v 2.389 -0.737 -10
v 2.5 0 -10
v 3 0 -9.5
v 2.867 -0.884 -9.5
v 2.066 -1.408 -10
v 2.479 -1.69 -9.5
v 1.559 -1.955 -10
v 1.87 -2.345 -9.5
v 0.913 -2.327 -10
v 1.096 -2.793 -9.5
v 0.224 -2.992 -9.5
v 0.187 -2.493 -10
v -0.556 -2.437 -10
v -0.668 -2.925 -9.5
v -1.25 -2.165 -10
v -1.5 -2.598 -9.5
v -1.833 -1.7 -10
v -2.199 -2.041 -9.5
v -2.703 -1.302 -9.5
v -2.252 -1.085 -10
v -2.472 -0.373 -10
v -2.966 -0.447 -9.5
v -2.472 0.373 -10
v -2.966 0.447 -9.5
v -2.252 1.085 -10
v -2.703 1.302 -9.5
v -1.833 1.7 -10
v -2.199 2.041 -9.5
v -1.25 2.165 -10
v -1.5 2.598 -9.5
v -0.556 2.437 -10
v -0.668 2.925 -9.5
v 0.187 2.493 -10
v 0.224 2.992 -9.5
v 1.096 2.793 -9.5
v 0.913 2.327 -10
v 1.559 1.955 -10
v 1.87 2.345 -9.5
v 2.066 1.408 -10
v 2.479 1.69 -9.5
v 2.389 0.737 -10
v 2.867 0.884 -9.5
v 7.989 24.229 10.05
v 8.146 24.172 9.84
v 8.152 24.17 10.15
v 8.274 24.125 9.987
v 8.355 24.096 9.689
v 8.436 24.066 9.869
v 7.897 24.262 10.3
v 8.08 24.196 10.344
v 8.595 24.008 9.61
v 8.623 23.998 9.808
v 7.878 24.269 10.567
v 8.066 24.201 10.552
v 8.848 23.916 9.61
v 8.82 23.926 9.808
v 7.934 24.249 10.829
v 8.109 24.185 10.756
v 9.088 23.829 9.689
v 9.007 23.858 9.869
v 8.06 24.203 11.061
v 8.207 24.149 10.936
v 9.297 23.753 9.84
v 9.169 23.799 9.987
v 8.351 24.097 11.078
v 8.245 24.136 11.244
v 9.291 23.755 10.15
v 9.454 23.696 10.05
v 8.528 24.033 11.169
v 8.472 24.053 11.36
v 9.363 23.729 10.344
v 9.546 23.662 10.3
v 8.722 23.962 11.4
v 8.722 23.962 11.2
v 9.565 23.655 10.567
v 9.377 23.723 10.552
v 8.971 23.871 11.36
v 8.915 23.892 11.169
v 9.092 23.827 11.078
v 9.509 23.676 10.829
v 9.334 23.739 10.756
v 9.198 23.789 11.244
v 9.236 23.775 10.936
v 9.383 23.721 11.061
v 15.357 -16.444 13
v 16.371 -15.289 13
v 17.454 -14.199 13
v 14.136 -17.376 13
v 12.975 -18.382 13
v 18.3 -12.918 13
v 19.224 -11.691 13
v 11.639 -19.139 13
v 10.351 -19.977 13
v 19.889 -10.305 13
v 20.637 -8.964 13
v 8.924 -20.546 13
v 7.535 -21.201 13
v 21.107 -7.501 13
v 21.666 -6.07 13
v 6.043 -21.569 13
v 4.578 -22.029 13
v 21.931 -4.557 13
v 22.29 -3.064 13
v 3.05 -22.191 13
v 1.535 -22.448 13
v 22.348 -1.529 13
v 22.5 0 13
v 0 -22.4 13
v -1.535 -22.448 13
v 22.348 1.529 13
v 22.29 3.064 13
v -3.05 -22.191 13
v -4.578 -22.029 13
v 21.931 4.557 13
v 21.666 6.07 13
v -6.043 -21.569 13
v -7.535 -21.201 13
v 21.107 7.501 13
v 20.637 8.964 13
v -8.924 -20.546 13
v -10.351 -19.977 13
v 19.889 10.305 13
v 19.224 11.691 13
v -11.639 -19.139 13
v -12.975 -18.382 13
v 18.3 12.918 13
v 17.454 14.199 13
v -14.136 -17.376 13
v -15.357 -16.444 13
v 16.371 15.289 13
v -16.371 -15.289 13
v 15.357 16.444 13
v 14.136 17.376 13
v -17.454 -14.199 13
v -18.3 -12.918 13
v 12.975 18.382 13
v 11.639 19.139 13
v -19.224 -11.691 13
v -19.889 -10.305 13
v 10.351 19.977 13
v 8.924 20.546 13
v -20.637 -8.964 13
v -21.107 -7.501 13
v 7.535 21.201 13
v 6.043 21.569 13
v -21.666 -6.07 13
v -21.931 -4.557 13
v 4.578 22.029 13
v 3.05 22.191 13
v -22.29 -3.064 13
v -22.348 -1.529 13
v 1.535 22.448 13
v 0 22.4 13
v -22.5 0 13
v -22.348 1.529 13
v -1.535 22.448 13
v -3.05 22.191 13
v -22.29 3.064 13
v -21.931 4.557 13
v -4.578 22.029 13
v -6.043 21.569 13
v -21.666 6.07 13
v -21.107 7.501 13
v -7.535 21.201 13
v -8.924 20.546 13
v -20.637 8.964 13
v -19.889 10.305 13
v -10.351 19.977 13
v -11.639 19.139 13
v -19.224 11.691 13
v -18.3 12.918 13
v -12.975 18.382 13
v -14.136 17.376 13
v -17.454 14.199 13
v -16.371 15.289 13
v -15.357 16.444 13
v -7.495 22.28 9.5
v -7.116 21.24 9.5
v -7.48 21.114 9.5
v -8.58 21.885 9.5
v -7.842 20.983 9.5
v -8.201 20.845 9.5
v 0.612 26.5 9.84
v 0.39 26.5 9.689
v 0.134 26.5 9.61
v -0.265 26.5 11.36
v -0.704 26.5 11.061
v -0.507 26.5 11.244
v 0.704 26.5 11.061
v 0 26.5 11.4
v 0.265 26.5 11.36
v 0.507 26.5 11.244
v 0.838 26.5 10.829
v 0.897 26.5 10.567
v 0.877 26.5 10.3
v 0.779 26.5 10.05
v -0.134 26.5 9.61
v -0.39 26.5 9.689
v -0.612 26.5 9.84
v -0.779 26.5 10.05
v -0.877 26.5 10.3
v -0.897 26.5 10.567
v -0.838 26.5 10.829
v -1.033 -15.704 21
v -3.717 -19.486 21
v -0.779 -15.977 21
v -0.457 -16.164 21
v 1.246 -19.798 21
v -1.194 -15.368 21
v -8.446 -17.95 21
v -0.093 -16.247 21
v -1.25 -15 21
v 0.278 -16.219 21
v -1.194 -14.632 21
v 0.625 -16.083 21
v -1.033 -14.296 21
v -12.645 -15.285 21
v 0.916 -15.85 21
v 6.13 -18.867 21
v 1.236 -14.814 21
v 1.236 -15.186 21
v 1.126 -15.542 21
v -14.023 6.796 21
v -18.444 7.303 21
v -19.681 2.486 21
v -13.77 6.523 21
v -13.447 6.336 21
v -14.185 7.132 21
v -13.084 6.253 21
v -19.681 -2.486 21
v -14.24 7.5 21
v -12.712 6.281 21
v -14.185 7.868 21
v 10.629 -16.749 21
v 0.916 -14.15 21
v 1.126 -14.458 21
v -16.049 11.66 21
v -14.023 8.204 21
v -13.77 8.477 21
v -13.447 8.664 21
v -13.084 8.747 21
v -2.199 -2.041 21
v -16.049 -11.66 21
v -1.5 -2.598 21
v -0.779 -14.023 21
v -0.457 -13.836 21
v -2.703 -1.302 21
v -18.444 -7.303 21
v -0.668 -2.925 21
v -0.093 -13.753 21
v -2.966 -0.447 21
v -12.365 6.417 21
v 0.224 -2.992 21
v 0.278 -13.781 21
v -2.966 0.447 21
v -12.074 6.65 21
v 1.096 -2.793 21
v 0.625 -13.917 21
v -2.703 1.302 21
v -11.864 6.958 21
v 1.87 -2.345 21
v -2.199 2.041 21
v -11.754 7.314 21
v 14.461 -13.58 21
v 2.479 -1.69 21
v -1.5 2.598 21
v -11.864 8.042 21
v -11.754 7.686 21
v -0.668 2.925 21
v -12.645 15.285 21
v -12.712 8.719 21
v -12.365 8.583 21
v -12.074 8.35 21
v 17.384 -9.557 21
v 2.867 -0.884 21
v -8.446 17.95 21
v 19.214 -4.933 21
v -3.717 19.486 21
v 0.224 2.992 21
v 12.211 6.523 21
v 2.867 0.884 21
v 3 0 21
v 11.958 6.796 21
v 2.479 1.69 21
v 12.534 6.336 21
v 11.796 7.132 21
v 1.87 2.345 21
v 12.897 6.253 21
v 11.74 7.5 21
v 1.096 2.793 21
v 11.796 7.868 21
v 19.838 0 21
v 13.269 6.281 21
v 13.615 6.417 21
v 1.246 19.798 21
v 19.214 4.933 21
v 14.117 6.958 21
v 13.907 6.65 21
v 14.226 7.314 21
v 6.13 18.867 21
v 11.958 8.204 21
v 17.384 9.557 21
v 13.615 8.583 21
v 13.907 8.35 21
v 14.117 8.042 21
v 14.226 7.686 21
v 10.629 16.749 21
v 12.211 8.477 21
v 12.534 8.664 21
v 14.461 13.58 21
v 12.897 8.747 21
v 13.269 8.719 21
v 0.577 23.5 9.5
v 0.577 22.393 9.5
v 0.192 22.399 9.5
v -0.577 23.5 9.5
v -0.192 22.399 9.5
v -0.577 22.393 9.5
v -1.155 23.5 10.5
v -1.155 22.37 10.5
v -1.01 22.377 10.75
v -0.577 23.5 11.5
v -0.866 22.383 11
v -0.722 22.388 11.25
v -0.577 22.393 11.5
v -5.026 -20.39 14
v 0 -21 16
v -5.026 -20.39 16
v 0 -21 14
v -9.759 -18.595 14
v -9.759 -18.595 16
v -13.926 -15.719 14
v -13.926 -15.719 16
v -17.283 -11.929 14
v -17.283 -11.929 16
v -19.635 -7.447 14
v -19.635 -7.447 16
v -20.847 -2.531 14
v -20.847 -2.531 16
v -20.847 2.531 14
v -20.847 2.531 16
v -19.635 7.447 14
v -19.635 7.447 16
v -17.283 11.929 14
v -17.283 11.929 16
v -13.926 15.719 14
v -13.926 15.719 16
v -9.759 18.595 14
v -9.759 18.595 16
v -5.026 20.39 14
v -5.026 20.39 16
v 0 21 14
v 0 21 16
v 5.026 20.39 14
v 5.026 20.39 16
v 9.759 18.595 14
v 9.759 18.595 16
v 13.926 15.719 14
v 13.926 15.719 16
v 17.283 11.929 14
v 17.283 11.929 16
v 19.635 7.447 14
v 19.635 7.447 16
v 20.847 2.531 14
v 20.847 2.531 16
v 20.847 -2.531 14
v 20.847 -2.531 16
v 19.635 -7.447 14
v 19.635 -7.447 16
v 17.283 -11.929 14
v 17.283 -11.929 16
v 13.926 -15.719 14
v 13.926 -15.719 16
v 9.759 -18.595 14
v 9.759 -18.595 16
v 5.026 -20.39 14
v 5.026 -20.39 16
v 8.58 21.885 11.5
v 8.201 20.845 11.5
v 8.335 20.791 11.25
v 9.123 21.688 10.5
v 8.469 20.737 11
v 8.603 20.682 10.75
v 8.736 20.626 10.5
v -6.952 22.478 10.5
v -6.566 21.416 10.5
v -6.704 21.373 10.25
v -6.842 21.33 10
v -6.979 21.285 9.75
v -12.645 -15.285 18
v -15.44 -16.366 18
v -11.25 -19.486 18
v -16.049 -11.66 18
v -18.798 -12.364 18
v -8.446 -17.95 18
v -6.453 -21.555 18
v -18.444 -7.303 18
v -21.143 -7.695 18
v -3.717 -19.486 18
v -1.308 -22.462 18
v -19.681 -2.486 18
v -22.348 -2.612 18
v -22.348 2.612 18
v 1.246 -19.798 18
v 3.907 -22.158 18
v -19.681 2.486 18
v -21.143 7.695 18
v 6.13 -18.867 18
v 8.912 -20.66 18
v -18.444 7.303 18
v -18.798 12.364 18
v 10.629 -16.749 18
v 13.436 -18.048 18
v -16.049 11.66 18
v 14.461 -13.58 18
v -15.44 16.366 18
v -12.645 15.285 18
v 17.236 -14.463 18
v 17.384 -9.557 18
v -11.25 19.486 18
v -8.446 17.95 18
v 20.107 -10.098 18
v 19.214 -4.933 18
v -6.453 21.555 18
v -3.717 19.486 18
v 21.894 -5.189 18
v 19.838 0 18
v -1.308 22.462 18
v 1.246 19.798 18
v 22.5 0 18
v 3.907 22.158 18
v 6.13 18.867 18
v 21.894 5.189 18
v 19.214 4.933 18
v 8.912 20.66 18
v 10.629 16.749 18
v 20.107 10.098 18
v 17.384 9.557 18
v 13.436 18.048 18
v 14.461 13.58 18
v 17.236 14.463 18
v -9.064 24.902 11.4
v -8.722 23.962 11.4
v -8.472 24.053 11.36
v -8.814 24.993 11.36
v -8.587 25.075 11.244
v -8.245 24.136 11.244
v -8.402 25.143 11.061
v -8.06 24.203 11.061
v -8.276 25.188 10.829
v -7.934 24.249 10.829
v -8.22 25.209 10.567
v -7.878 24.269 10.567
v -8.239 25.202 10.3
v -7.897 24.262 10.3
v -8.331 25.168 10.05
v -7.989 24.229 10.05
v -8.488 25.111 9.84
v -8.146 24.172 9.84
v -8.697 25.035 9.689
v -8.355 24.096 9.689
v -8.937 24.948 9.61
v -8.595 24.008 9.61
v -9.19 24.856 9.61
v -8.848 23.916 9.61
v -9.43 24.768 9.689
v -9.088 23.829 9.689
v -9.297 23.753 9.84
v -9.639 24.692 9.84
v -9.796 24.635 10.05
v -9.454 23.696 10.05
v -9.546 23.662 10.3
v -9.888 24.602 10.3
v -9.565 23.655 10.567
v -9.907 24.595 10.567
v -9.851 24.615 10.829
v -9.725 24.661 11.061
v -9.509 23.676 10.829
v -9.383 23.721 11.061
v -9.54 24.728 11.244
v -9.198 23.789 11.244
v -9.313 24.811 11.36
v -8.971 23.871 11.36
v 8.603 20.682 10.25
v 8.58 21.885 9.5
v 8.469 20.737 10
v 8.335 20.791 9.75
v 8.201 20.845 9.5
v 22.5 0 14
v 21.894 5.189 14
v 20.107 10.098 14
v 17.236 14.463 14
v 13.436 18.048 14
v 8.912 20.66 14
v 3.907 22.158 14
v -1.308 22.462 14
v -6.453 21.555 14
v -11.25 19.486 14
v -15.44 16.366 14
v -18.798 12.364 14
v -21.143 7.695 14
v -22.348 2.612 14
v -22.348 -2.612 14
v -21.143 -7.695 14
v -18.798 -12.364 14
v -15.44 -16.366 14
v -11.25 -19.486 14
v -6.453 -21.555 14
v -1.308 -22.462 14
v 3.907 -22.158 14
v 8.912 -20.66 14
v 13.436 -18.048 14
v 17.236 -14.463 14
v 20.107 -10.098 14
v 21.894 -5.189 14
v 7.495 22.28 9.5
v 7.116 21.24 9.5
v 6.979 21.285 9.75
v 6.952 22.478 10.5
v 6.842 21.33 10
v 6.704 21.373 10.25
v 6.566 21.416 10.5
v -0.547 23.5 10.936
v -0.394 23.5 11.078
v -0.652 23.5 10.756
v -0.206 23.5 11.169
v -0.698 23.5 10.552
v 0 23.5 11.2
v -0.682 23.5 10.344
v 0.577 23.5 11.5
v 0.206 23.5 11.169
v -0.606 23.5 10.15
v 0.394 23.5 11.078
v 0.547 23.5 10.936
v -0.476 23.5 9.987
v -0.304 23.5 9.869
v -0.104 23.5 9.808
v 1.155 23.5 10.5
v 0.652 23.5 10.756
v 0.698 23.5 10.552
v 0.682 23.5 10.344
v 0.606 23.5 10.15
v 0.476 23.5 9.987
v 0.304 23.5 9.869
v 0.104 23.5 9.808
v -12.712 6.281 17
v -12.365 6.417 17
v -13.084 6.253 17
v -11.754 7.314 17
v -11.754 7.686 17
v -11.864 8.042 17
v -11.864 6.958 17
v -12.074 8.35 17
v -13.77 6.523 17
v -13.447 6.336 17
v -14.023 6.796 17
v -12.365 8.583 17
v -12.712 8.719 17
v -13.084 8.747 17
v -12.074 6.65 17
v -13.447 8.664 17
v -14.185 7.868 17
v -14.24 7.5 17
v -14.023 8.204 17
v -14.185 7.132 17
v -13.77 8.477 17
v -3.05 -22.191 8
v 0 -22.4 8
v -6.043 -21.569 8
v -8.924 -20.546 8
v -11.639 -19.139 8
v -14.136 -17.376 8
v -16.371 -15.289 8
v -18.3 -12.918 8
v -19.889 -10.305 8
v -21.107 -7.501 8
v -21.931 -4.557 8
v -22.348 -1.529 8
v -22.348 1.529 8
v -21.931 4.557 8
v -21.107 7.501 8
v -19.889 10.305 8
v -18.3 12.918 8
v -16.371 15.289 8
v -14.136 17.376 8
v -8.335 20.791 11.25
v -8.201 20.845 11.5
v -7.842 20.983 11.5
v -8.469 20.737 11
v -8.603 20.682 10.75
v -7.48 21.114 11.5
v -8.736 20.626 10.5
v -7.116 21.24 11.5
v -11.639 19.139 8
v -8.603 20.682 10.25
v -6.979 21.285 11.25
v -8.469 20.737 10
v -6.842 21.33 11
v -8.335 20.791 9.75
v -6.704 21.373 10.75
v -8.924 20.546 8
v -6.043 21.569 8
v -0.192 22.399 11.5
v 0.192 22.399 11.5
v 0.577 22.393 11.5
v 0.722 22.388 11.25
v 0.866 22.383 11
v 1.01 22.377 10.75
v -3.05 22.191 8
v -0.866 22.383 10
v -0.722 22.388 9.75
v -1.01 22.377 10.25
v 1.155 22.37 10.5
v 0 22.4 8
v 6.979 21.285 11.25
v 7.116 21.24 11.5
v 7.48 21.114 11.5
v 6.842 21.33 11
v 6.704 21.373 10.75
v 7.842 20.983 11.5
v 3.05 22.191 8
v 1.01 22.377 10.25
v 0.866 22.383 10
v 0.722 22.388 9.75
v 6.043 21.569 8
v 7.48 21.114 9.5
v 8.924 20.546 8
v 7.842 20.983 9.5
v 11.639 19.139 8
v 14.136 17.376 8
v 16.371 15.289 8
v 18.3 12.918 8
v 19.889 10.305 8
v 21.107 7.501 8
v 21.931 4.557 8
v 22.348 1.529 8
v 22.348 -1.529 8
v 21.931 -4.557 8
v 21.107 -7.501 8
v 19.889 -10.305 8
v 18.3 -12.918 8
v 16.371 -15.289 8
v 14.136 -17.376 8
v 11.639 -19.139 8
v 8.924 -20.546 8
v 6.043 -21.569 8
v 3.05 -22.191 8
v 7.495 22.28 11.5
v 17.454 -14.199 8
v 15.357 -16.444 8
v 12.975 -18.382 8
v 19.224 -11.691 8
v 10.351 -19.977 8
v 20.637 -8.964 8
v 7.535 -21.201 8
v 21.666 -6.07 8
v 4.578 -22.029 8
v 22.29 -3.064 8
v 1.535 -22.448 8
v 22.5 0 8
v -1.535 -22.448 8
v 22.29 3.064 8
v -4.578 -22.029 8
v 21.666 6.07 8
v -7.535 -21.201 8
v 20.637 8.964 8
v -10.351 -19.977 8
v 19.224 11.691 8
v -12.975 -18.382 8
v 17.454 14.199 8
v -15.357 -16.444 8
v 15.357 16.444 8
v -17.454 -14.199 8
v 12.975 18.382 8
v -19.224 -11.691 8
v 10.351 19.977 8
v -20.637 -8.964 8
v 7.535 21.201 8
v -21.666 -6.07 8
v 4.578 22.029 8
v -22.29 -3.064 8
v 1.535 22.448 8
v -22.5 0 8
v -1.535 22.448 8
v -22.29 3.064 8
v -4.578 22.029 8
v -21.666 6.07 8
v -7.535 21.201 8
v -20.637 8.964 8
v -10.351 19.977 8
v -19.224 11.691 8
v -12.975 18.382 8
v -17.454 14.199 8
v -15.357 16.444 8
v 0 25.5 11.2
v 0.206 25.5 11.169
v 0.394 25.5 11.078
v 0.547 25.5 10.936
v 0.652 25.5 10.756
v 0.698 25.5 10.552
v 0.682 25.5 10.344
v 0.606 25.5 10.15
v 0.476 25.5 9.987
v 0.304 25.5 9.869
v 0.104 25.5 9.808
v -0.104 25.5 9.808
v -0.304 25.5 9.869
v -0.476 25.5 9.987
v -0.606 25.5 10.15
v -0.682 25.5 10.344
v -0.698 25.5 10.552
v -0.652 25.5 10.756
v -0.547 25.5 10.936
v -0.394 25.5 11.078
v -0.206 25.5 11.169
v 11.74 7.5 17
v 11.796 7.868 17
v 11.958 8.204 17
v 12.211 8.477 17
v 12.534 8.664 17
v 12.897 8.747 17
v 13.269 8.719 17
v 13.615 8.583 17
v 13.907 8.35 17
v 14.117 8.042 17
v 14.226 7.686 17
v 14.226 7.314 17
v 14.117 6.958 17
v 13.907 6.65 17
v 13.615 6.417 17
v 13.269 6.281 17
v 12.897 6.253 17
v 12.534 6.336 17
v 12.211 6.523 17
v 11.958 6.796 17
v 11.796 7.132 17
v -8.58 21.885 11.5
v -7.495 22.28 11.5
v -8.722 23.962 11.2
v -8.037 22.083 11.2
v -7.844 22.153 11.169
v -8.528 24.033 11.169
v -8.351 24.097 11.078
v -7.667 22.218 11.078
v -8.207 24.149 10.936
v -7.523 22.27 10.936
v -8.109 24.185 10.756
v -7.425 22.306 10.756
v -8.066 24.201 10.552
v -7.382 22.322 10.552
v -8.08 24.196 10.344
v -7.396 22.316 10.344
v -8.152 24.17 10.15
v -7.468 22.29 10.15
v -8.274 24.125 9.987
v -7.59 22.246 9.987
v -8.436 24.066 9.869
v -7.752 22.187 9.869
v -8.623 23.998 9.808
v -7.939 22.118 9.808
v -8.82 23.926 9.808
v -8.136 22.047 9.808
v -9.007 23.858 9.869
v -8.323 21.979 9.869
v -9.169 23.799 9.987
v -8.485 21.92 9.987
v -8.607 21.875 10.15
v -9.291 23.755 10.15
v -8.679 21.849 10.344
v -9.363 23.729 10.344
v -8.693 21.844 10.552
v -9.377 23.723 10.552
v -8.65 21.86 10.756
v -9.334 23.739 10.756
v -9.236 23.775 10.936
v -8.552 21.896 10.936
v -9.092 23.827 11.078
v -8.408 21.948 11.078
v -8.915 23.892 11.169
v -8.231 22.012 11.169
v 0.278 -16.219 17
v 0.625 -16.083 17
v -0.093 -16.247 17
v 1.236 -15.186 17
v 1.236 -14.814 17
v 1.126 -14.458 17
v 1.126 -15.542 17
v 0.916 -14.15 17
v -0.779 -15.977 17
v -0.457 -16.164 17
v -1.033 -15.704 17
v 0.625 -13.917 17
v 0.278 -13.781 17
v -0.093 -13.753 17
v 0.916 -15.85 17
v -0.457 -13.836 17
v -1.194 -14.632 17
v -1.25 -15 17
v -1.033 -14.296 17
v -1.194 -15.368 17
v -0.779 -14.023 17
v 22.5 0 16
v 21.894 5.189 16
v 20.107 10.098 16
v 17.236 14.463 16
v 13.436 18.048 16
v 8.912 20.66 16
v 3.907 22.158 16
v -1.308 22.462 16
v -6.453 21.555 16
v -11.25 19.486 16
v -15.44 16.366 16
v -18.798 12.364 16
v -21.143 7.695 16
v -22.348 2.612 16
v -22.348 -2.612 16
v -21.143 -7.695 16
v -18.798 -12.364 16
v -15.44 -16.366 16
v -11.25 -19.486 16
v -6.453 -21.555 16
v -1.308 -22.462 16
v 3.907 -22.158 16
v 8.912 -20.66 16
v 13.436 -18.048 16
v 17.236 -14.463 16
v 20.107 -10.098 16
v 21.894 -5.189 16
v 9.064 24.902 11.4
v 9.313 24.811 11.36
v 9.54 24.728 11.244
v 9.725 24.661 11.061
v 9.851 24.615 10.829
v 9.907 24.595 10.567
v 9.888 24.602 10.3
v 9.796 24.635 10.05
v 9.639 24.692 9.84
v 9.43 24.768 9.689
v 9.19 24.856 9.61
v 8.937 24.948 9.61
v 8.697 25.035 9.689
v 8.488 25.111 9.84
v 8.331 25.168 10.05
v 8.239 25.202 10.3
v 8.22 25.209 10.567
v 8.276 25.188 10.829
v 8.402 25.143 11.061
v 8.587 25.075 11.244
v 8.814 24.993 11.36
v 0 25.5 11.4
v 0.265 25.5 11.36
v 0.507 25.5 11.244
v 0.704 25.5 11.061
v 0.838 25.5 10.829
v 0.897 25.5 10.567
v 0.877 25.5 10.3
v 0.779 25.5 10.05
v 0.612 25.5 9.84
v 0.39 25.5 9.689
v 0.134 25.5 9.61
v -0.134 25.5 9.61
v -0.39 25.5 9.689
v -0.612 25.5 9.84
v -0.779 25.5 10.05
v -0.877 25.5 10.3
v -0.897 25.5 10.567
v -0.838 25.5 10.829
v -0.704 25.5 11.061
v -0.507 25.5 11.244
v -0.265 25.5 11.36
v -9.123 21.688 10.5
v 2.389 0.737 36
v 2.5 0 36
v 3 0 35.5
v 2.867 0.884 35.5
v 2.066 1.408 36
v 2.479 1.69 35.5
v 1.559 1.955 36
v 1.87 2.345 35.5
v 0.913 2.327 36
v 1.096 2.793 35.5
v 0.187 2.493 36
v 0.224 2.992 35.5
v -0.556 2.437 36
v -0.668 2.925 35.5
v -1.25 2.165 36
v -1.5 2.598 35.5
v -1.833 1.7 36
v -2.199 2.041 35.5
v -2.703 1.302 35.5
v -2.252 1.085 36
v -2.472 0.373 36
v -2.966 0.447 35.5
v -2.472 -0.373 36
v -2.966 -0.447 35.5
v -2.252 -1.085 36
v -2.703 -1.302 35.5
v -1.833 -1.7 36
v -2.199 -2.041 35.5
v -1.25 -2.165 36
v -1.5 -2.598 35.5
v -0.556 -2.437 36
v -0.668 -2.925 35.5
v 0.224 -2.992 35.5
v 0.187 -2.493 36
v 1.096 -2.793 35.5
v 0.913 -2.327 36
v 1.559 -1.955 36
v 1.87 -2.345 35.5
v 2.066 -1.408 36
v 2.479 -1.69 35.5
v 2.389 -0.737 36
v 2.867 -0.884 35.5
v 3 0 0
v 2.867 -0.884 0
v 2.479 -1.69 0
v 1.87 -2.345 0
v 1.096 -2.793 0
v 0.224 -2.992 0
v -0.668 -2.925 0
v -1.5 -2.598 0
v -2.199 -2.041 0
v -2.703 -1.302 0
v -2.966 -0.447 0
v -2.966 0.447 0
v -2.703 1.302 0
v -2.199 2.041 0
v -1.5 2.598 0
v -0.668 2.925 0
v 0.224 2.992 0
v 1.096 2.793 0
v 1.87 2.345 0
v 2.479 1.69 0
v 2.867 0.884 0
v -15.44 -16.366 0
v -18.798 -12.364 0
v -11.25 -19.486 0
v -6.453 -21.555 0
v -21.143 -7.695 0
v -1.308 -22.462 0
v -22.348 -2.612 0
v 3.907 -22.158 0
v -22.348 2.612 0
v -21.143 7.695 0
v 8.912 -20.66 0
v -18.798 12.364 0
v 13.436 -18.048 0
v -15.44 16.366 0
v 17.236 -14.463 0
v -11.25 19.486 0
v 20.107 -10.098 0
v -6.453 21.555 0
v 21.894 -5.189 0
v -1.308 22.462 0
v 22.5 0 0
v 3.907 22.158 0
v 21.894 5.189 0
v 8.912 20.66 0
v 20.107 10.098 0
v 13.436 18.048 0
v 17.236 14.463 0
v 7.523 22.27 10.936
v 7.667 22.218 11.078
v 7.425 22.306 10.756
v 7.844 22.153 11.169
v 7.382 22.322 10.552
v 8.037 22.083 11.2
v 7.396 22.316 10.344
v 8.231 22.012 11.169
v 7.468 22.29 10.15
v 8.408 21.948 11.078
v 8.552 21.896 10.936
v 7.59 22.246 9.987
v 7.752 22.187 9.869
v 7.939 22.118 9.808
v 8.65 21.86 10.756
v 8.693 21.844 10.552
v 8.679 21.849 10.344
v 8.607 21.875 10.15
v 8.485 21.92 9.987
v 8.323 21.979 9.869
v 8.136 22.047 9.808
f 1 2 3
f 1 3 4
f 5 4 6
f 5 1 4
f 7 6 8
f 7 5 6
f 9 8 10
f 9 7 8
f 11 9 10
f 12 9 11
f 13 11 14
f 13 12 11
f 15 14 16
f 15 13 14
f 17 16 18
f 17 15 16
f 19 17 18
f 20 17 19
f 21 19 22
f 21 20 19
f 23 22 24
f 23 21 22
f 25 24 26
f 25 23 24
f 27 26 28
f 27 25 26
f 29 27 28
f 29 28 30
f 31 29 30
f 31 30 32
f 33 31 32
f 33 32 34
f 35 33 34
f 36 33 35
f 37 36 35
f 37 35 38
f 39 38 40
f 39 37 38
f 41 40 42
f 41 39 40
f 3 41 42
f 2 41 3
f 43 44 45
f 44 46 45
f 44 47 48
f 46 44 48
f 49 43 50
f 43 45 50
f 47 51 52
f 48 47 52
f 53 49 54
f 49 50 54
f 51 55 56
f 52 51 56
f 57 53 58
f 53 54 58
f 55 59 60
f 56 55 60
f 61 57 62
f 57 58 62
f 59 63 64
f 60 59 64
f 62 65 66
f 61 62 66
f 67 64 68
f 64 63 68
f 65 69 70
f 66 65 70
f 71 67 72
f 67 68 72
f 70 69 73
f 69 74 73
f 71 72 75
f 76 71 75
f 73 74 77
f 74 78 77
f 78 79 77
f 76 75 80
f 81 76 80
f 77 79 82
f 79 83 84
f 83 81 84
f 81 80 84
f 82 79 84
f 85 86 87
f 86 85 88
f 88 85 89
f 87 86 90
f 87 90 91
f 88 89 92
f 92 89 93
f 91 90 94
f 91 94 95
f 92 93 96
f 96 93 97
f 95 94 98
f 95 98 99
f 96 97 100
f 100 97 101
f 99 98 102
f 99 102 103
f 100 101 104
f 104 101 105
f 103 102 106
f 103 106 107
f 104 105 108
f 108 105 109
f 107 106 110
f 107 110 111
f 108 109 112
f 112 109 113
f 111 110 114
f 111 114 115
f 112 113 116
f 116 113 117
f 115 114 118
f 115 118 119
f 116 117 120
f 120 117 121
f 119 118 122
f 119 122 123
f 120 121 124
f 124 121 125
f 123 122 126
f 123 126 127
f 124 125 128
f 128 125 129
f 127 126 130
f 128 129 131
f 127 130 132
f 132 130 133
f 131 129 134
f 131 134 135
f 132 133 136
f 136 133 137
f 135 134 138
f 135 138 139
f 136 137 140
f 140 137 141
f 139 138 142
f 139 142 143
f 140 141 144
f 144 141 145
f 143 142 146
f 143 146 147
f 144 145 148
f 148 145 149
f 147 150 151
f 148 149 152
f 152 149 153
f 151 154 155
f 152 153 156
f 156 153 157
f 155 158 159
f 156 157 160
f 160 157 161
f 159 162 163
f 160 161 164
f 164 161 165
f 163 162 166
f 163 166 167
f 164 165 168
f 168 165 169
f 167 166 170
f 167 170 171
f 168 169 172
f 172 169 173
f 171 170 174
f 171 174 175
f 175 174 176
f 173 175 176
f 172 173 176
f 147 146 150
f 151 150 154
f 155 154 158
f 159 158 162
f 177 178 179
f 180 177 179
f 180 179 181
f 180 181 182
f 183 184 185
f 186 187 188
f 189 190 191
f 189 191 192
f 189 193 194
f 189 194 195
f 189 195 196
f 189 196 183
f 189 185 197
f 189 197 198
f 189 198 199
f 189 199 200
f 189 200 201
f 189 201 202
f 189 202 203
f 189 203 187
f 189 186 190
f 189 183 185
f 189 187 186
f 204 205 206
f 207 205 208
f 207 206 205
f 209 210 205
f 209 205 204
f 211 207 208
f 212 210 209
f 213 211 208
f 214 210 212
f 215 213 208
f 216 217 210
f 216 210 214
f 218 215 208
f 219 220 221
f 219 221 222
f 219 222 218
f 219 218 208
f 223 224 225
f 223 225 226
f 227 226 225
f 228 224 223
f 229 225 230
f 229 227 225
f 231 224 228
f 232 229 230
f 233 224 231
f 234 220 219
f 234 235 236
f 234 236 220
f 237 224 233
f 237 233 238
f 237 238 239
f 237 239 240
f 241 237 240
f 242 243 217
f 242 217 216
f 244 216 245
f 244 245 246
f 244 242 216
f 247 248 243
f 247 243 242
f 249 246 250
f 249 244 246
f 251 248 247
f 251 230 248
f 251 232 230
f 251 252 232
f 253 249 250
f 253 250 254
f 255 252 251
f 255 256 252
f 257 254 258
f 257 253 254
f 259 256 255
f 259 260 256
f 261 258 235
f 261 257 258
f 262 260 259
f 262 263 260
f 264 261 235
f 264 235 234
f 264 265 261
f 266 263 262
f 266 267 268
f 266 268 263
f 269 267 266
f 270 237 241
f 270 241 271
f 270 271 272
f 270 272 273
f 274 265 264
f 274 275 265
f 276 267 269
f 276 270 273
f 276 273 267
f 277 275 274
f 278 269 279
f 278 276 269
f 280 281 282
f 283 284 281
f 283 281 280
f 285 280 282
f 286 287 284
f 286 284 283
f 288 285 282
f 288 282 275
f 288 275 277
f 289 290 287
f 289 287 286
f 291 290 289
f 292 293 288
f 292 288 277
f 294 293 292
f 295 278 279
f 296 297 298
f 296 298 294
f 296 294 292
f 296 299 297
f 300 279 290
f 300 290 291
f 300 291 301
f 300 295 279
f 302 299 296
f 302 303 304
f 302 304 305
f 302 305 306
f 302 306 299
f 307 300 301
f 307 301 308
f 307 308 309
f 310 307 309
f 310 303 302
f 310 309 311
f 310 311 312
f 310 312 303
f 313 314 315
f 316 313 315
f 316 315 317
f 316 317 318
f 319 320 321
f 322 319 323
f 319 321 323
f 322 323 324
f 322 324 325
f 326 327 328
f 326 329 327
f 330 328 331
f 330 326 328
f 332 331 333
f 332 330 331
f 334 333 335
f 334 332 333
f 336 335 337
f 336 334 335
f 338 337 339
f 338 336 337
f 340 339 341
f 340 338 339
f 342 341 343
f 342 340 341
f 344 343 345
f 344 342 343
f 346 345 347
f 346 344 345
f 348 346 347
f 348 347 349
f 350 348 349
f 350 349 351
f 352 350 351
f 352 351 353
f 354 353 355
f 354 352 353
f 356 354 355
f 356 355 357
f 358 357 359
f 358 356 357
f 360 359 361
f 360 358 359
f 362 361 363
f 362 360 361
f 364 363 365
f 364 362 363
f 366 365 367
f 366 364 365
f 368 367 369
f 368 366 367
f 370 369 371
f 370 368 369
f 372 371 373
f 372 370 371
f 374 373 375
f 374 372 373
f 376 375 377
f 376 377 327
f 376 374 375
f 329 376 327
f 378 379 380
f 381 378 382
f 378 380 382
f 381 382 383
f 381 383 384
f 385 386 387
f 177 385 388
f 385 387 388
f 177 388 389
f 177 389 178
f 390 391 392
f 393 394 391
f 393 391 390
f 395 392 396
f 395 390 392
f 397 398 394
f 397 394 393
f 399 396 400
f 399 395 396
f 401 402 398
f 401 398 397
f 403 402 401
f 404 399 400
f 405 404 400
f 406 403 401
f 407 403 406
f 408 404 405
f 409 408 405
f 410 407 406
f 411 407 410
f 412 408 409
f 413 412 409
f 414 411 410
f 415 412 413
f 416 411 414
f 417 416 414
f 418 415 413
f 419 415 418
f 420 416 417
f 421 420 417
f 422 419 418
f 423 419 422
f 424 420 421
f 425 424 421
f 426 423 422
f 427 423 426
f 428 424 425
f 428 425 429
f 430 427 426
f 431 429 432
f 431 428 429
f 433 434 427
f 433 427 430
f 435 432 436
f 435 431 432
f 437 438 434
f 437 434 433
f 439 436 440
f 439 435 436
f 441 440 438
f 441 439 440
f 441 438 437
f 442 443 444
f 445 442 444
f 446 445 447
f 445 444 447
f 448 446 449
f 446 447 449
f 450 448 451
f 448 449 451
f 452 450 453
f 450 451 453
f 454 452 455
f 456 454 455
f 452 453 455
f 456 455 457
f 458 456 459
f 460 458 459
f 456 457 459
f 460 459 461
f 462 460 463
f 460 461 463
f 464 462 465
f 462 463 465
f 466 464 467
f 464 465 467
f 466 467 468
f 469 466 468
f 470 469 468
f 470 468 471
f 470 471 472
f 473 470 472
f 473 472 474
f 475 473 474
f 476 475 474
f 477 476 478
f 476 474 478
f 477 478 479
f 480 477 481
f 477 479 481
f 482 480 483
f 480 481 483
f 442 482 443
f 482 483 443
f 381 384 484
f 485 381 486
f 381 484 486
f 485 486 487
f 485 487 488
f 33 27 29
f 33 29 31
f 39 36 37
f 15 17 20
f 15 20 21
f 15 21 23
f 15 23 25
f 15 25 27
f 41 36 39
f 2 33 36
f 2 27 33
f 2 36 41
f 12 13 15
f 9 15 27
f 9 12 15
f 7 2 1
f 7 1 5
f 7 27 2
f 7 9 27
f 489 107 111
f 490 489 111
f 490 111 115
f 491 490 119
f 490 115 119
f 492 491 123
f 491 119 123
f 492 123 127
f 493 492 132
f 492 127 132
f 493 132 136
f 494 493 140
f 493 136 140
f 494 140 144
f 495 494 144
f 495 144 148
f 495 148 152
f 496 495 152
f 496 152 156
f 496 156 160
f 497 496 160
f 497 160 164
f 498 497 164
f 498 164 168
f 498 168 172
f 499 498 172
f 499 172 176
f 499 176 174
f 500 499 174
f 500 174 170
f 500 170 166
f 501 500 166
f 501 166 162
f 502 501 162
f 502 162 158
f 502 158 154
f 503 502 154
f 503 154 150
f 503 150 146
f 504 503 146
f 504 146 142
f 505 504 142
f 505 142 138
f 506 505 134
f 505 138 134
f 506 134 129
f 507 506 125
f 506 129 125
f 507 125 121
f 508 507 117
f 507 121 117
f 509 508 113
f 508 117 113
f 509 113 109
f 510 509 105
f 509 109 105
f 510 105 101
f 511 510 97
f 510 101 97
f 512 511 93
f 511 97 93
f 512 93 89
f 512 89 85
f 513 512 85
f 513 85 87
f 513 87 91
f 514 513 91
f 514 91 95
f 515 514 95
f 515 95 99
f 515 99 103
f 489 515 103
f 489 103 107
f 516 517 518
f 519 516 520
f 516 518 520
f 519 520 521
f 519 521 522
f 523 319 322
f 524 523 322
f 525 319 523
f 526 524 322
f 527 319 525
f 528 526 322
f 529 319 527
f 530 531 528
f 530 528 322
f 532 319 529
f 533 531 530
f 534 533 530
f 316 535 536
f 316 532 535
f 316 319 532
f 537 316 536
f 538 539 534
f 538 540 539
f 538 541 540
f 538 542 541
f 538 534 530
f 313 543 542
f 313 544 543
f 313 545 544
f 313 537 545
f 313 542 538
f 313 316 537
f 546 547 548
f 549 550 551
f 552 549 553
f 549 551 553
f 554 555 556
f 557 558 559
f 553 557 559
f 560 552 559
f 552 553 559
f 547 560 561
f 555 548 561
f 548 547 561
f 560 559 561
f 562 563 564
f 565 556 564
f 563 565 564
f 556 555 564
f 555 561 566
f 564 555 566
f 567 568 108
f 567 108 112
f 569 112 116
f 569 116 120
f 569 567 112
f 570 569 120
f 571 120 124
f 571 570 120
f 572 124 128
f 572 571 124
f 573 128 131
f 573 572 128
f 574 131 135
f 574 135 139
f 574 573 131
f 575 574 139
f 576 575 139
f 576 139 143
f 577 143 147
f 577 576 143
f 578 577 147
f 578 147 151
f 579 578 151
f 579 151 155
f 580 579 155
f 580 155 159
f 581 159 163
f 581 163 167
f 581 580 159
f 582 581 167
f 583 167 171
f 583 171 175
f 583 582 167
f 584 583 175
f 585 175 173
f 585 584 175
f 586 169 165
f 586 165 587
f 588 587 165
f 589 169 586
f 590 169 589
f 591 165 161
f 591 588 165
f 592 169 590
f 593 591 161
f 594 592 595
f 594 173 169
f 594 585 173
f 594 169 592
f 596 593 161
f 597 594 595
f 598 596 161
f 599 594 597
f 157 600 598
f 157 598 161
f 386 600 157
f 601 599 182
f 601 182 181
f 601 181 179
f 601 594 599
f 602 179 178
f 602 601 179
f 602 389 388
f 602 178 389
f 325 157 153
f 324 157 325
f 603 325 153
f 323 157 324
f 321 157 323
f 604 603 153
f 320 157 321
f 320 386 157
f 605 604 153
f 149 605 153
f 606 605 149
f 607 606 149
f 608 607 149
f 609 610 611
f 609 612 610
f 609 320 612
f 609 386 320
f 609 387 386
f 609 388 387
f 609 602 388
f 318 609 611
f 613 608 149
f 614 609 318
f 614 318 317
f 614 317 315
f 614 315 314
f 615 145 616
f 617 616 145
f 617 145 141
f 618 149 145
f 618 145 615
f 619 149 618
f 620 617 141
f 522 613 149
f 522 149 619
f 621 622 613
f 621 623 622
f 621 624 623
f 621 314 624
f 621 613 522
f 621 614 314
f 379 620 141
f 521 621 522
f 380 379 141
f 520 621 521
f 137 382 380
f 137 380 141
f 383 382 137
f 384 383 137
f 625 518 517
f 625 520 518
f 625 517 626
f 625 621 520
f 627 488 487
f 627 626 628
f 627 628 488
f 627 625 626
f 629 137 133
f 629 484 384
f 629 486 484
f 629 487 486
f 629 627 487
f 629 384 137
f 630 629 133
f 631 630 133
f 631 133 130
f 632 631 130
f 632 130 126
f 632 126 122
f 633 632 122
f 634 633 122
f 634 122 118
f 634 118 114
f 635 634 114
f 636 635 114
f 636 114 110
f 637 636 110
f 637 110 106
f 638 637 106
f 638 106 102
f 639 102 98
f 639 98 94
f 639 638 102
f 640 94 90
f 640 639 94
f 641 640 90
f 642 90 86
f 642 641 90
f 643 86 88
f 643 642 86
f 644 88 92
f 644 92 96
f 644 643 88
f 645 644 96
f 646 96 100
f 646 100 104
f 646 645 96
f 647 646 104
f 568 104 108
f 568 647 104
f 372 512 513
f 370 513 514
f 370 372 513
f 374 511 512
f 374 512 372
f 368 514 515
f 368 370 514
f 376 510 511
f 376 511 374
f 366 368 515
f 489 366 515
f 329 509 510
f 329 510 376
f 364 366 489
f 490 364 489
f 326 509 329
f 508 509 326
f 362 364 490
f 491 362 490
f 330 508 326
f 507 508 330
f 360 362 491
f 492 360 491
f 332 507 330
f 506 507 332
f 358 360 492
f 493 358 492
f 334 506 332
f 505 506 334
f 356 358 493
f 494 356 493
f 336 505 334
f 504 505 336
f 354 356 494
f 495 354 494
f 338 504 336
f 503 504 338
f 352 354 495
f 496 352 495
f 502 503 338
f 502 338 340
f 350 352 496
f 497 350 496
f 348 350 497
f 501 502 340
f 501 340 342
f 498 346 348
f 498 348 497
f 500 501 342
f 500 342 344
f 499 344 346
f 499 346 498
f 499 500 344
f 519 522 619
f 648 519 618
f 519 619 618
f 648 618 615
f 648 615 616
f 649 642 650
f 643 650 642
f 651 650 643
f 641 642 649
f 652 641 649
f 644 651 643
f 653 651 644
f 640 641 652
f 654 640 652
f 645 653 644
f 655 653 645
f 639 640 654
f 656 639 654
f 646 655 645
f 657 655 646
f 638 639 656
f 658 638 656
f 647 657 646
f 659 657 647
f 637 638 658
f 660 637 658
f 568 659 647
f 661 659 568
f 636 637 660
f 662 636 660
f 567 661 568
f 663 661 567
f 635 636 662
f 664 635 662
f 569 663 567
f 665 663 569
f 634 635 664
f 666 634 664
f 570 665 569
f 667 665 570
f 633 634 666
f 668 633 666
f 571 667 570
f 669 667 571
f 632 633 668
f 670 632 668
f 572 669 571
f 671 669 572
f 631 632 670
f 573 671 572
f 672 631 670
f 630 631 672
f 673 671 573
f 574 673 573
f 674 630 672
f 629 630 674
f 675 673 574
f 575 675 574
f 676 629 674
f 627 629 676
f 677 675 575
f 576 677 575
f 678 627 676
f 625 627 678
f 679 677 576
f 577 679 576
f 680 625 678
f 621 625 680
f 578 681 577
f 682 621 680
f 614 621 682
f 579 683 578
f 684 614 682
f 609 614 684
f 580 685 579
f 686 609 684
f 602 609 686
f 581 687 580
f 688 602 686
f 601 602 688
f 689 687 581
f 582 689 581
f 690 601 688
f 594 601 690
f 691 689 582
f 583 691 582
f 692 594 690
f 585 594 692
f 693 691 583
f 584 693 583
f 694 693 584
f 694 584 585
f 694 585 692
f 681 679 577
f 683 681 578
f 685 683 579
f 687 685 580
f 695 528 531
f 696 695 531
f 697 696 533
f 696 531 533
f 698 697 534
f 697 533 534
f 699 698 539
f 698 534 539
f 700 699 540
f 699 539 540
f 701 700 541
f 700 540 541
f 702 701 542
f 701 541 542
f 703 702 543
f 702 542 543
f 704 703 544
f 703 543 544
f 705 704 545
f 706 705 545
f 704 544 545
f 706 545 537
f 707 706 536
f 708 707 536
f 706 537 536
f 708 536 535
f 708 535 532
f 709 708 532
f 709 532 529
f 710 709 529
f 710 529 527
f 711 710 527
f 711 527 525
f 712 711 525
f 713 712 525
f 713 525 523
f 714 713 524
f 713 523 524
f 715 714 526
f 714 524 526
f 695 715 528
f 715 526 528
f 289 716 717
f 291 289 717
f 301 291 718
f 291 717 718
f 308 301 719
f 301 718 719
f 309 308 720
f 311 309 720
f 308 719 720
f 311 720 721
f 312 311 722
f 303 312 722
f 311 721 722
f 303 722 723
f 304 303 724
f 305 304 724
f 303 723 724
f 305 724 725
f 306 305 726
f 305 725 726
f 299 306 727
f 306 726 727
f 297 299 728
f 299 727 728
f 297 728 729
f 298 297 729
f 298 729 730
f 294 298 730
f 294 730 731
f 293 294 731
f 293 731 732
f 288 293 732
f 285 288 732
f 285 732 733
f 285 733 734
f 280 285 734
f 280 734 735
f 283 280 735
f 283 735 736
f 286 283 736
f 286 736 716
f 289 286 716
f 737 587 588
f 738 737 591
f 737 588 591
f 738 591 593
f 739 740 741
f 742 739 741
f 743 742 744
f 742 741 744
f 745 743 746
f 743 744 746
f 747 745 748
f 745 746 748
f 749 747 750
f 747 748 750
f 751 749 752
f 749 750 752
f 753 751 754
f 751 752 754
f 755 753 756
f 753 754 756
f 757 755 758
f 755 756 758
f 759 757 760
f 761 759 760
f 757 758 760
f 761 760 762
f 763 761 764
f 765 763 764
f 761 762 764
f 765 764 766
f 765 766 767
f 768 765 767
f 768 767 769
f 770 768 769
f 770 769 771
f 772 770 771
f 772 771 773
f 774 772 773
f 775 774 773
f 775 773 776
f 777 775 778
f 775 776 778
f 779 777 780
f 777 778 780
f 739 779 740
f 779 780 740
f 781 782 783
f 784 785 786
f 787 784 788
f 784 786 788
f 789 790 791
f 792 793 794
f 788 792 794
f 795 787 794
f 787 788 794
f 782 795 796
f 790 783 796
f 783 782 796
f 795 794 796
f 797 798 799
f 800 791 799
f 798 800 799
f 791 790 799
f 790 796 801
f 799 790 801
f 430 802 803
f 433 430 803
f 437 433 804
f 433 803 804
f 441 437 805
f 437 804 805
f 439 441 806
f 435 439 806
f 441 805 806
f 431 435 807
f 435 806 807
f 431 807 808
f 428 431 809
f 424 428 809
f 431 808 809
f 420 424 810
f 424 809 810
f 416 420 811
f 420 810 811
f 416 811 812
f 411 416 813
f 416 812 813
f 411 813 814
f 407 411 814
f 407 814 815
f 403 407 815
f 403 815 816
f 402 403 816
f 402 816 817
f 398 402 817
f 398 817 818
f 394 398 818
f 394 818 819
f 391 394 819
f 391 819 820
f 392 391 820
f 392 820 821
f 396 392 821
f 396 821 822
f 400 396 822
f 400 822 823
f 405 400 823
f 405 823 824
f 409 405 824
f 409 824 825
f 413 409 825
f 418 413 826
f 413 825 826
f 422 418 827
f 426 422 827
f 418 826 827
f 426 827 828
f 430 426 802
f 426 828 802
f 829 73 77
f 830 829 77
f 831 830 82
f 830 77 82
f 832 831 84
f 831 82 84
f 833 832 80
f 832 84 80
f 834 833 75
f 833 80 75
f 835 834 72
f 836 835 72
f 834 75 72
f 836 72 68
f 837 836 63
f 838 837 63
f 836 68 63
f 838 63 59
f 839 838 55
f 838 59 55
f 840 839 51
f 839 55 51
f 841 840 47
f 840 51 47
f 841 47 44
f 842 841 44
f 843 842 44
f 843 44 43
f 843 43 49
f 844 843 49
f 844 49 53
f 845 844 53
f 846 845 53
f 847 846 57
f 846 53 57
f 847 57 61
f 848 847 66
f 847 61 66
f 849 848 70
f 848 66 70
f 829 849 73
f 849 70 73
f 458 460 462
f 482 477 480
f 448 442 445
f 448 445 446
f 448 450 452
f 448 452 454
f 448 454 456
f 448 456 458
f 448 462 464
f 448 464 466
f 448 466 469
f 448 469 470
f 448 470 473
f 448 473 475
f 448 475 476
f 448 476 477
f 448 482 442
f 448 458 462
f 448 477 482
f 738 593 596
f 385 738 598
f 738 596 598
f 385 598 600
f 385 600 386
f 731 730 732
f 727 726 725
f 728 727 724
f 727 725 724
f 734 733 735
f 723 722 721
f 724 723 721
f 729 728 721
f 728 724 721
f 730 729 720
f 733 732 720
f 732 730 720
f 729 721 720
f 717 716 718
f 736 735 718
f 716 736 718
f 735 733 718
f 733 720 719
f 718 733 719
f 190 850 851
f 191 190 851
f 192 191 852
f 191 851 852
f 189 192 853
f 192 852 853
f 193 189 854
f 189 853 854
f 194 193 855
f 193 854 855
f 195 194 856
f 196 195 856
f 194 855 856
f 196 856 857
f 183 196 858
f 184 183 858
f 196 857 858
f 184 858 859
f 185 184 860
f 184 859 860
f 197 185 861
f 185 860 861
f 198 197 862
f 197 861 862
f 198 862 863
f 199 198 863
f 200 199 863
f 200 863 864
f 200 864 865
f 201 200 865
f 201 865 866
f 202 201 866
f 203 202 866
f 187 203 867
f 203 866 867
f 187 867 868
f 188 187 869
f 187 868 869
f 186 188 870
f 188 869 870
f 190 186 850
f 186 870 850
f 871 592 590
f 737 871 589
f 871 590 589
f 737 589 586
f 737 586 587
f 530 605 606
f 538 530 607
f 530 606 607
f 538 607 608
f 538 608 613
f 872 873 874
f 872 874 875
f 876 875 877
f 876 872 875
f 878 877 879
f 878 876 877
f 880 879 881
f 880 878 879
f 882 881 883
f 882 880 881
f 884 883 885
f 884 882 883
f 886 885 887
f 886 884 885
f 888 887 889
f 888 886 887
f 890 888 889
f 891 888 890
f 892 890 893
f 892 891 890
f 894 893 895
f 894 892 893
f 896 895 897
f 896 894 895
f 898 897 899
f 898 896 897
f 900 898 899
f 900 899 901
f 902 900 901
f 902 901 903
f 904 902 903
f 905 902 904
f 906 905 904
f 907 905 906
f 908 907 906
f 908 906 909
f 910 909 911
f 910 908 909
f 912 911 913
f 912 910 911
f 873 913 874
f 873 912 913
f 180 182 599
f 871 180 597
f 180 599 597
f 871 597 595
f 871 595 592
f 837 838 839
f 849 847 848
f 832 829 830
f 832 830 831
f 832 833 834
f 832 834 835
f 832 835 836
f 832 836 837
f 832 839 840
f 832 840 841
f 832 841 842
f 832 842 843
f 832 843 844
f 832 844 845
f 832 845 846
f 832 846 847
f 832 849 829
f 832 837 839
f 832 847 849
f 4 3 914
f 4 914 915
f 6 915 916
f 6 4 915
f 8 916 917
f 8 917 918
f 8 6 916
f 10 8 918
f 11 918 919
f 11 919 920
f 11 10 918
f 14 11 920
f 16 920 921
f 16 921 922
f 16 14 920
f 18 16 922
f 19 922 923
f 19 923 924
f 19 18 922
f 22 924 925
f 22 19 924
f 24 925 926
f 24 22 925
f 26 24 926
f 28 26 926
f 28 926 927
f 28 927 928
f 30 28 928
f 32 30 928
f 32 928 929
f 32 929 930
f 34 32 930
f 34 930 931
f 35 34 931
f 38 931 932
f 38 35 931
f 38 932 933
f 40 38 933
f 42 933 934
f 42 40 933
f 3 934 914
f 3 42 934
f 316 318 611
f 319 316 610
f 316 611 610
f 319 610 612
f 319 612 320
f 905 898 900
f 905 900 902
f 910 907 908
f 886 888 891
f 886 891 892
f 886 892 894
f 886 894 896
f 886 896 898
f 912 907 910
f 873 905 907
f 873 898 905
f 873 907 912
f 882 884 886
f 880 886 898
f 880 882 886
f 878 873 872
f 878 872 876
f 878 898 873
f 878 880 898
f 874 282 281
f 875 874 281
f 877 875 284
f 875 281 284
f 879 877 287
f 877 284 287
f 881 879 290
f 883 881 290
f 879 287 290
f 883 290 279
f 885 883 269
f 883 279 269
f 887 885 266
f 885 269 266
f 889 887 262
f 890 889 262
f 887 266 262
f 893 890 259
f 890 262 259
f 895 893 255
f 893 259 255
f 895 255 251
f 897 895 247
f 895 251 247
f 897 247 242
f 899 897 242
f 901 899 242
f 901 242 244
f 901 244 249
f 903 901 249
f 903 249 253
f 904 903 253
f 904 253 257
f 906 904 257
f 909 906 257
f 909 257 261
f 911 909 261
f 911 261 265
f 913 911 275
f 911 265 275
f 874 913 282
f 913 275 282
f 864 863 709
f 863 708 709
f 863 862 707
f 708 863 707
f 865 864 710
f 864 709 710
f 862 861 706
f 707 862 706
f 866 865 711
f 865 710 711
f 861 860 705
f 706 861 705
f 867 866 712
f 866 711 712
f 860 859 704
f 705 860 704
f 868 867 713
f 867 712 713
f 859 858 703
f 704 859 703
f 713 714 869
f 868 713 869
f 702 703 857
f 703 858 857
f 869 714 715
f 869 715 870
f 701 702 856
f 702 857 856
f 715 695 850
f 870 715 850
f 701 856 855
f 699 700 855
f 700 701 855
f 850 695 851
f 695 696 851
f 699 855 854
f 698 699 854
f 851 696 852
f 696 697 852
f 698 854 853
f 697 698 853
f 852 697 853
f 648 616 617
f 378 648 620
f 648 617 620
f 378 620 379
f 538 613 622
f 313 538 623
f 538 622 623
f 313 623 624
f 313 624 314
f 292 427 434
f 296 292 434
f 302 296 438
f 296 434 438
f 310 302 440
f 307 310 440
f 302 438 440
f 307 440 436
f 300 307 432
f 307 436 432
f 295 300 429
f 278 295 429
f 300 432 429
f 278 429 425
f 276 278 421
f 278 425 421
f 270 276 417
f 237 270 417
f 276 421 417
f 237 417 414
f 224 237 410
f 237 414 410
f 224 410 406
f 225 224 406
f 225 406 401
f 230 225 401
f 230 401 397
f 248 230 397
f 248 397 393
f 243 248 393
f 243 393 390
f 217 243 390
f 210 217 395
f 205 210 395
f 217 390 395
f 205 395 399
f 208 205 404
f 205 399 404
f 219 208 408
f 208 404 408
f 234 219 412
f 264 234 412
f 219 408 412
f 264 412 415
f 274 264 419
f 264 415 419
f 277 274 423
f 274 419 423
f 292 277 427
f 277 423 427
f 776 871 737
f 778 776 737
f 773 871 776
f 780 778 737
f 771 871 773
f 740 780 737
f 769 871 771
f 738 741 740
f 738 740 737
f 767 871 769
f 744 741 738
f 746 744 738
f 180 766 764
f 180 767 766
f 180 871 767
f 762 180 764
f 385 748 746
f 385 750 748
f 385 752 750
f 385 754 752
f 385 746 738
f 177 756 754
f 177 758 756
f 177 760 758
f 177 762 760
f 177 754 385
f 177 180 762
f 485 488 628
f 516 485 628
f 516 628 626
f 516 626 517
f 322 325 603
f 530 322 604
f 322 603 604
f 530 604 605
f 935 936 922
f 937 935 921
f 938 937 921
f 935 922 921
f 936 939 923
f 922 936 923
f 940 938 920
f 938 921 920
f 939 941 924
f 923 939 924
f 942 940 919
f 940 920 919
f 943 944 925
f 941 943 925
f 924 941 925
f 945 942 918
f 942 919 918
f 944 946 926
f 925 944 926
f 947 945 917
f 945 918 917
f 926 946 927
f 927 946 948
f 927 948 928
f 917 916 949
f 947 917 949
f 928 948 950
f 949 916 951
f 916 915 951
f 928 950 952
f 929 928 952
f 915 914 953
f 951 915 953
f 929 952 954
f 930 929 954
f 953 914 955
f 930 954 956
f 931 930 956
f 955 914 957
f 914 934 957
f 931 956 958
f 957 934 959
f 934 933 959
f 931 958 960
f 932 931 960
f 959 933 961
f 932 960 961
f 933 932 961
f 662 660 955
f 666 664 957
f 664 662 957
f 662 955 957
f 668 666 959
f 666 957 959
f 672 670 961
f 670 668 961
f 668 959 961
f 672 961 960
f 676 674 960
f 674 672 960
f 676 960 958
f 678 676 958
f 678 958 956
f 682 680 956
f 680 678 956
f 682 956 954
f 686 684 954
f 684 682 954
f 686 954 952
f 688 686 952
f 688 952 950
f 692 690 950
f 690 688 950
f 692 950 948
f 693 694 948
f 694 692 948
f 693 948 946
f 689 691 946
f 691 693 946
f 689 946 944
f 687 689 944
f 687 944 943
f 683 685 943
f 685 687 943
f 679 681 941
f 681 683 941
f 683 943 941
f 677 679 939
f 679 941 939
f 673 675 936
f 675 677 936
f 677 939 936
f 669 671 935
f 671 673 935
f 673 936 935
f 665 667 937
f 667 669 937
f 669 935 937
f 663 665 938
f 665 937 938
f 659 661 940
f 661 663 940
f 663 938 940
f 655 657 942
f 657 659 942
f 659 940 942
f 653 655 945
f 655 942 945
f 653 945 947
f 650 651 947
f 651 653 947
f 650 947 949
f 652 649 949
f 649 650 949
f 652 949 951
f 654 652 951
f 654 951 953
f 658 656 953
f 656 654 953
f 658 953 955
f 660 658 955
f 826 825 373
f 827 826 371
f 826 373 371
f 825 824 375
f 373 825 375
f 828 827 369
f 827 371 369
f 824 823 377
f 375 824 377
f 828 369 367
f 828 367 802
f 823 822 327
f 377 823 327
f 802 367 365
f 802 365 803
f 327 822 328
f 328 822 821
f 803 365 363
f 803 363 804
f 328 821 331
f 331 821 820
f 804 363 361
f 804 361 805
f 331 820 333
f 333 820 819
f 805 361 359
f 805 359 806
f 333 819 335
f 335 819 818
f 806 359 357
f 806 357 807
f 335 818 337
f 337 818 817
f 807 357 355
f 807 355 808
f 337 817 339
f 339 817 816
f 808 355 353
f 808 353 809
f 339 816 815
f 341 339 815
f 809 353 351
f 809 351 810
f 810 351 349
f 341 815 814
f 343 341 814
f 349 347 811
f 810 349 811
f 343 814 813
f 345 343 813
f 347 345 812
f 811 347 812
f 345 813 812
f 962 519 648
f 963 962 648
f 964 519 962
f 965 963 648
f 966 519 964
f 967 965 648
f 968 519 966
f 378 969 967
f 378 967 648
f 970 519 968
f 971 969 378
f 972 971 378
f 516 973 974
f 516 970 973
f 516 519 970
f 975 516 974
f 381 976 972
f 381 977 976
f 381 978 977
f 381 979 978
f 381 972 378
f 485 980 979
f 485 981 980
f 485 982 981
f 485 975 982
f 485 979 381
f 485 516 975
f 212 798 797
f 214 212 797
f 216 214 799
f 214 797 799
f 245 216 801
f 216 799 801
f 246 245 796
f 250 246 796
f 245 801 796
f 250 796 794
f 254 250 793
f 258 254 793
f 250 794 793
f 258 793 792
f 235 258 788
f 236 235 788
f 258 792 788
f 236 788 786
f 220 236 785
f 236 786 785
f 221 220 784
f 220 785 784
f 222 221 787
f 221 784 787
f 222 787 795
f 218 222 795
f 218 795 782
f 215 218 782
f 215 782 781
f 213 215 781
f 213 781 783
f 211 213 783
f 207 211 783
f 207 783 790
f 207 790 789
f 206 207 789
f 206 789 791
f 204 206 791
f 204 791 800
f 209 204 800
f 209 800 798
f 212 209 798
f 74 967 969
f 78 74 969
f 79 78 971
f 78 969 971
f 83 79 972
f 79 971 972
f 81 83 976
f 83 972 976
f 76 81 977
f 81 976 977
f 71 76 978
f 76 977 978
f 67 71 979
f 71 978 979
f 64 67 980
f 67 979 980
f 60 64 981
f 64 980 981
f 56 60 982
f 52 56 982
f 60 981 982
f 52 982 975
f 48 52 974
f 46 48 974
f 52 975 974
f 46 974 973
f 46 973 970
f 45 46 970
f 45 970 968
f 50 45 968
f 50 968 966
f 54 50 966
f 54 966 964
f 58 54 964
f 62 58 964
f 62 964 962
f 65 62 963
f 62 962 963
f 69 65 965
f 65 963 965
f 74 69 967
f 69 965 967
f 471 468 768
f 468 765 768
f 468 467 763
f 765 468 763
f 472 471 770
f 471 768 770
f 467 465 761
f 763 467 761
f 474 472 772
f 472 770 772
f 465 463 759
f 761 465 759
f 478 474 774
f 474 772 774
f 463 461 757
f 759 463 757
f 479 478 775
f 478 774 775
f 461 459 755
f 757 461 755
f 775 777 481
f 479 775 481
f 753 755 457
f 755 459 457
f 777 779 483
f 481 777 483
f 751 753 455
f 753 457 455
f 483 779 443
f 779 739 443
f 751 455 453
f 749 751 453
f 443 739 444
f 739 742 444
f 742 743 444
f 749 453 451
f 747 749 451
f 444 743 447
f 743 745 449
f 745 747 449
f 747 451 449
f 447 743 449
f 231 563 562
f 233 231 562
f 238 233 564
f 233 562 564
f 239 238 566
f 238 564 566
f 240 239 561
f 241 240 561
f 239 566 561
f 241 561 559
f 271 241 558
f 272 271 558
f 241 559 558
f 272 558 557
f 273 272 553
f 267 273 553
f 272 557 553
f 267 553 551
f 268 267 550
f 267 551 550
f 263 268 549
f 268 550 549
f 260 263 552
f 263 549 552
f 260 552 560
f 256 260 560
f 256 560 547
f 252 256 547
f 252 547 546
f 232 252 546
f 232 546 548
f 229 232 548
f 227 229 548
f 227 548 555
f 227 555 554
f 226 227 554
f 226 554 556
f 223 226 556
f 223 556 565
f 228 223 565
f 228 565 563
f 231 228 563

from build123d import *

# Parameters (mm, degrees)
SKETCH1_R                       = 22.5
BOSS_EXTRUDE1_DEPTH             = 18
SKETCH2_W                       = 2
SKETCH2_H                       = 1.5
SKETCH2_W_2                     = 5
SKETCH2_H_2                     = 0.1
SKETCH3_R                       = 19.8375
BOSS_EXTRUDE2_DEPTH             = 3
SKETCH4_R                       = 3
BOSS_EXTRUDE3_DEPTH             = 15
BOSS_EXTRUDE4_START             = 10
SKETCH5_R                       = 3
BOSS_EXTRUDE4_DEPTH             = 10
CHAMFER1_SIZE                   = 0.5
M3X0_5_TAPPED_HOLE1_D           = 2.5
M3X0_5_TAPPED_HOLE1_DEPTH       = 4
BOSS_EXTRUDE5_DEPTH             = 23.5
SKETCH11_R                      = 0.7
BOSS_EXTRUDE6_DEPTH             = 2
SKETCH12_R                      = 0.9
BOSS_EXTRUDE7_DEPTH             = 1
CIRPATTERN1_COUNT               = 2
CIRPATTERN1_ANGLE               = 20
CIRPATTERN1_THE_OTHER_WAY_COUNT = 2
CIRPATTERN1_THE_OTHER_WAY_ANGLE = 20


with BuildPart() as part:
    # Sketch1 → Boss-Extrude1 (new body)
    with BuildSketch(Plane.XY):
        Circle(SKETCH1_R)
    extrude(amount=BOSS_EXTRUDE1_DEPTH)

    # Sketch2 → Cut-Revolve1 (revolve, cut)
    with BuildSketch(Plane(origin=(0, 0, 0), x_dir=(0, 0, -1), z_dir=(1, 0, 0)), mode=Mode.PRIVATE) as cut_revolve1_sk:
        with Locations((-15, 21.75)):
            Rectangle(SKETCH2_W, SKETCH2_H)
        with Locations((-10.5, 22.45)):
            Rectangle(SKETCH2_W_2, SKETCH2_H_2)
    revolve(cut_revolve1_sk.sketch.rotate(Axis((0, 0, 18), (0, 0, -1)), 180), axis=Axis((0, 0, 18), (0, 0, -1)), mode=Mode.SUBTRACT)

    # Sketch3 → Boss-Extrude2 (add)
    with BuildSketch(Plane.XY.offset(18)):
        Circle(SKETCH3_R)
    extrude(amount=BOSS_EXTRUDE2_DEPTH)

    # Sketch4 → Boss-Extrude3 (add)
    with BuildSketch(Plane.XY.offset(21)):
        Circle(SKETCH4_R)
    extrude(amount=BOSS_EXTRUDE3_DEPTH)

    # Sketch5 → Boss-Extrude4 (add)
    with BuildSketch(Plane(origin=(0, 0, 0), x_dir=(-1, 0, 0), z_dir=(0, 0, -1)).offset(BOSS_EXTRUDE4_START)):
        with Locations(Location((0, 0, 0), (0, 0, 180))):
            Circle(SKETCH5_R)
    extrude(amount=-BOSS_EXTRUDE4_DEPTH)

    # Chamfer1
    chamfer1_edges = [part.edges().sort_by_distance(p)[0] for p in [
        (-3, 0, 36),
        (-3, 0, -10),
    ]]
    chamfer(chamfer1_edges, length=CHAMFER1_SIZE)

    # M3x0.5 Tapped Hole1
    with Locations(Plane.XY.offset(21)):
        with Locations((12.990381057, 7.5), (0, -15), (-12.990381057, 7.5)):
            Hole(M3X0_5_TAPPED_HOLE1_D / 2, depth=M3X0_5_TAPPED_HOLE1_DEPTH)

    # Sketch10 → Boss-Extrude5 (add)
    with BuildSketch(Plane(origin=(0, 0, 0), x_dir=(1, 0, 0), z_dir=(0, 1, 0))):
        Polygon((1.154700538, -10.5), (0.577350269, -9.5), (-0.577350269, -9.5), (-1.154700538, -10.5), (-0.577350269, -11.5), (0.577350269, -11.5), align=None)
    boss_extrude5 = extrude(amount=BOSS_EXTRUDE5_DEPTH)

    # Sketch11 → Boss-Extrude6 (add)
    with BuildSketch(Plane(origin=(0, 23.5, 0), x_dir=(1, 0, 0), z_dir=(0, 1, 0))):
        with Locations(Location((0, -10.5, 0), (0, 0, 270))):
            Circle(SKETCH11_R)
    boss_extrude6 = extrude(amount=BOSS_EXTRUDE6_DEPTH)

    # Sketch12 → Boss-Extrude7 (add)
    with BuildSketch(Plane(origin=(0, 25.5, 0), x_dir=(1, 0, 0), z_dir=(0, 1, 0))):
        with Locations(Location((0, -10.5, 0), (0, 0, 270))):
            Circle(SKETCH12_R)
    boss_extrude7 = extrude(amount=BOSS_EXTRUDE7_DEPTH)

    # CirPattern1: Boss-Extrude5, Boss-Extrude6, Boss-Extrude7 ×2 about axis
    cirpattern1_axis = Axis((0, 0, 0), (0, 0, 1))
    add([boss_extrude5.rotate(cirpattern1_axis, i * CIRPATTERN1_ANGLE / (CIRPATTERN1_COUNT - 1)) for i in range(1, CIRPATTERN1_COUNT)])
    add([boss_extrude6.rotate(cirpattern1_axis, i * CIRPATTERN1_ANGLE / (CIRPATTERN1_COUNT - 1)) for i in range(1, CIRPATTERN1_COUNT)])
    add([boss_extrude7.rotate(cirpattern1_axis, i * CIRPATTERN1_ANGLE / (CIRPATTERN1_COUNT - 1)) for i in range(1, CIRPATTERN1_COUNT)])

    # CirPattern1 the other way: Boss-Extrude5, Boss-Extrude6, Boss-Extrude7 ×2 about axis
    cirpattern1_the_other_way_axis = Axis((0, 0, 0), (0, 0, -1))
    add([boss_extrude5.rotate(cirpattern1_the_other_way_axis, i * CIRPATTERN1_THE_OTHER_WAY_ANGLE / (CIRPATTERN1_THE_OTHER_WAY_COUNT - 1)) for i in range(1, CIRPATTERN1_THE_OTHER_WAY_COUNT)])
    add([boss_extrude6.rotate(cirpattern1_the_other_way_axis, i * CIRPATTERN1_THE_OTHER_WAY_ANGLE / (CIRPATTERN1_THE_OTHER_WAY_COUNT - 1)) for i in range(1, CIRPATTERN1_THE_OTHER_WAY_COUNT)])
    add([boss_extrude7.rotate(cirpattern1_the_other_way_axis, i * CIRPATTERN1_THE_OTHER_WAY_ANGLE / (CIRPATTERN1_THE_OTHER_WAY_COUNT - 1)) for i in range(1, CIRPATTERN1_THE_OTHER_WAY_COUNT)])


solid = part.part
